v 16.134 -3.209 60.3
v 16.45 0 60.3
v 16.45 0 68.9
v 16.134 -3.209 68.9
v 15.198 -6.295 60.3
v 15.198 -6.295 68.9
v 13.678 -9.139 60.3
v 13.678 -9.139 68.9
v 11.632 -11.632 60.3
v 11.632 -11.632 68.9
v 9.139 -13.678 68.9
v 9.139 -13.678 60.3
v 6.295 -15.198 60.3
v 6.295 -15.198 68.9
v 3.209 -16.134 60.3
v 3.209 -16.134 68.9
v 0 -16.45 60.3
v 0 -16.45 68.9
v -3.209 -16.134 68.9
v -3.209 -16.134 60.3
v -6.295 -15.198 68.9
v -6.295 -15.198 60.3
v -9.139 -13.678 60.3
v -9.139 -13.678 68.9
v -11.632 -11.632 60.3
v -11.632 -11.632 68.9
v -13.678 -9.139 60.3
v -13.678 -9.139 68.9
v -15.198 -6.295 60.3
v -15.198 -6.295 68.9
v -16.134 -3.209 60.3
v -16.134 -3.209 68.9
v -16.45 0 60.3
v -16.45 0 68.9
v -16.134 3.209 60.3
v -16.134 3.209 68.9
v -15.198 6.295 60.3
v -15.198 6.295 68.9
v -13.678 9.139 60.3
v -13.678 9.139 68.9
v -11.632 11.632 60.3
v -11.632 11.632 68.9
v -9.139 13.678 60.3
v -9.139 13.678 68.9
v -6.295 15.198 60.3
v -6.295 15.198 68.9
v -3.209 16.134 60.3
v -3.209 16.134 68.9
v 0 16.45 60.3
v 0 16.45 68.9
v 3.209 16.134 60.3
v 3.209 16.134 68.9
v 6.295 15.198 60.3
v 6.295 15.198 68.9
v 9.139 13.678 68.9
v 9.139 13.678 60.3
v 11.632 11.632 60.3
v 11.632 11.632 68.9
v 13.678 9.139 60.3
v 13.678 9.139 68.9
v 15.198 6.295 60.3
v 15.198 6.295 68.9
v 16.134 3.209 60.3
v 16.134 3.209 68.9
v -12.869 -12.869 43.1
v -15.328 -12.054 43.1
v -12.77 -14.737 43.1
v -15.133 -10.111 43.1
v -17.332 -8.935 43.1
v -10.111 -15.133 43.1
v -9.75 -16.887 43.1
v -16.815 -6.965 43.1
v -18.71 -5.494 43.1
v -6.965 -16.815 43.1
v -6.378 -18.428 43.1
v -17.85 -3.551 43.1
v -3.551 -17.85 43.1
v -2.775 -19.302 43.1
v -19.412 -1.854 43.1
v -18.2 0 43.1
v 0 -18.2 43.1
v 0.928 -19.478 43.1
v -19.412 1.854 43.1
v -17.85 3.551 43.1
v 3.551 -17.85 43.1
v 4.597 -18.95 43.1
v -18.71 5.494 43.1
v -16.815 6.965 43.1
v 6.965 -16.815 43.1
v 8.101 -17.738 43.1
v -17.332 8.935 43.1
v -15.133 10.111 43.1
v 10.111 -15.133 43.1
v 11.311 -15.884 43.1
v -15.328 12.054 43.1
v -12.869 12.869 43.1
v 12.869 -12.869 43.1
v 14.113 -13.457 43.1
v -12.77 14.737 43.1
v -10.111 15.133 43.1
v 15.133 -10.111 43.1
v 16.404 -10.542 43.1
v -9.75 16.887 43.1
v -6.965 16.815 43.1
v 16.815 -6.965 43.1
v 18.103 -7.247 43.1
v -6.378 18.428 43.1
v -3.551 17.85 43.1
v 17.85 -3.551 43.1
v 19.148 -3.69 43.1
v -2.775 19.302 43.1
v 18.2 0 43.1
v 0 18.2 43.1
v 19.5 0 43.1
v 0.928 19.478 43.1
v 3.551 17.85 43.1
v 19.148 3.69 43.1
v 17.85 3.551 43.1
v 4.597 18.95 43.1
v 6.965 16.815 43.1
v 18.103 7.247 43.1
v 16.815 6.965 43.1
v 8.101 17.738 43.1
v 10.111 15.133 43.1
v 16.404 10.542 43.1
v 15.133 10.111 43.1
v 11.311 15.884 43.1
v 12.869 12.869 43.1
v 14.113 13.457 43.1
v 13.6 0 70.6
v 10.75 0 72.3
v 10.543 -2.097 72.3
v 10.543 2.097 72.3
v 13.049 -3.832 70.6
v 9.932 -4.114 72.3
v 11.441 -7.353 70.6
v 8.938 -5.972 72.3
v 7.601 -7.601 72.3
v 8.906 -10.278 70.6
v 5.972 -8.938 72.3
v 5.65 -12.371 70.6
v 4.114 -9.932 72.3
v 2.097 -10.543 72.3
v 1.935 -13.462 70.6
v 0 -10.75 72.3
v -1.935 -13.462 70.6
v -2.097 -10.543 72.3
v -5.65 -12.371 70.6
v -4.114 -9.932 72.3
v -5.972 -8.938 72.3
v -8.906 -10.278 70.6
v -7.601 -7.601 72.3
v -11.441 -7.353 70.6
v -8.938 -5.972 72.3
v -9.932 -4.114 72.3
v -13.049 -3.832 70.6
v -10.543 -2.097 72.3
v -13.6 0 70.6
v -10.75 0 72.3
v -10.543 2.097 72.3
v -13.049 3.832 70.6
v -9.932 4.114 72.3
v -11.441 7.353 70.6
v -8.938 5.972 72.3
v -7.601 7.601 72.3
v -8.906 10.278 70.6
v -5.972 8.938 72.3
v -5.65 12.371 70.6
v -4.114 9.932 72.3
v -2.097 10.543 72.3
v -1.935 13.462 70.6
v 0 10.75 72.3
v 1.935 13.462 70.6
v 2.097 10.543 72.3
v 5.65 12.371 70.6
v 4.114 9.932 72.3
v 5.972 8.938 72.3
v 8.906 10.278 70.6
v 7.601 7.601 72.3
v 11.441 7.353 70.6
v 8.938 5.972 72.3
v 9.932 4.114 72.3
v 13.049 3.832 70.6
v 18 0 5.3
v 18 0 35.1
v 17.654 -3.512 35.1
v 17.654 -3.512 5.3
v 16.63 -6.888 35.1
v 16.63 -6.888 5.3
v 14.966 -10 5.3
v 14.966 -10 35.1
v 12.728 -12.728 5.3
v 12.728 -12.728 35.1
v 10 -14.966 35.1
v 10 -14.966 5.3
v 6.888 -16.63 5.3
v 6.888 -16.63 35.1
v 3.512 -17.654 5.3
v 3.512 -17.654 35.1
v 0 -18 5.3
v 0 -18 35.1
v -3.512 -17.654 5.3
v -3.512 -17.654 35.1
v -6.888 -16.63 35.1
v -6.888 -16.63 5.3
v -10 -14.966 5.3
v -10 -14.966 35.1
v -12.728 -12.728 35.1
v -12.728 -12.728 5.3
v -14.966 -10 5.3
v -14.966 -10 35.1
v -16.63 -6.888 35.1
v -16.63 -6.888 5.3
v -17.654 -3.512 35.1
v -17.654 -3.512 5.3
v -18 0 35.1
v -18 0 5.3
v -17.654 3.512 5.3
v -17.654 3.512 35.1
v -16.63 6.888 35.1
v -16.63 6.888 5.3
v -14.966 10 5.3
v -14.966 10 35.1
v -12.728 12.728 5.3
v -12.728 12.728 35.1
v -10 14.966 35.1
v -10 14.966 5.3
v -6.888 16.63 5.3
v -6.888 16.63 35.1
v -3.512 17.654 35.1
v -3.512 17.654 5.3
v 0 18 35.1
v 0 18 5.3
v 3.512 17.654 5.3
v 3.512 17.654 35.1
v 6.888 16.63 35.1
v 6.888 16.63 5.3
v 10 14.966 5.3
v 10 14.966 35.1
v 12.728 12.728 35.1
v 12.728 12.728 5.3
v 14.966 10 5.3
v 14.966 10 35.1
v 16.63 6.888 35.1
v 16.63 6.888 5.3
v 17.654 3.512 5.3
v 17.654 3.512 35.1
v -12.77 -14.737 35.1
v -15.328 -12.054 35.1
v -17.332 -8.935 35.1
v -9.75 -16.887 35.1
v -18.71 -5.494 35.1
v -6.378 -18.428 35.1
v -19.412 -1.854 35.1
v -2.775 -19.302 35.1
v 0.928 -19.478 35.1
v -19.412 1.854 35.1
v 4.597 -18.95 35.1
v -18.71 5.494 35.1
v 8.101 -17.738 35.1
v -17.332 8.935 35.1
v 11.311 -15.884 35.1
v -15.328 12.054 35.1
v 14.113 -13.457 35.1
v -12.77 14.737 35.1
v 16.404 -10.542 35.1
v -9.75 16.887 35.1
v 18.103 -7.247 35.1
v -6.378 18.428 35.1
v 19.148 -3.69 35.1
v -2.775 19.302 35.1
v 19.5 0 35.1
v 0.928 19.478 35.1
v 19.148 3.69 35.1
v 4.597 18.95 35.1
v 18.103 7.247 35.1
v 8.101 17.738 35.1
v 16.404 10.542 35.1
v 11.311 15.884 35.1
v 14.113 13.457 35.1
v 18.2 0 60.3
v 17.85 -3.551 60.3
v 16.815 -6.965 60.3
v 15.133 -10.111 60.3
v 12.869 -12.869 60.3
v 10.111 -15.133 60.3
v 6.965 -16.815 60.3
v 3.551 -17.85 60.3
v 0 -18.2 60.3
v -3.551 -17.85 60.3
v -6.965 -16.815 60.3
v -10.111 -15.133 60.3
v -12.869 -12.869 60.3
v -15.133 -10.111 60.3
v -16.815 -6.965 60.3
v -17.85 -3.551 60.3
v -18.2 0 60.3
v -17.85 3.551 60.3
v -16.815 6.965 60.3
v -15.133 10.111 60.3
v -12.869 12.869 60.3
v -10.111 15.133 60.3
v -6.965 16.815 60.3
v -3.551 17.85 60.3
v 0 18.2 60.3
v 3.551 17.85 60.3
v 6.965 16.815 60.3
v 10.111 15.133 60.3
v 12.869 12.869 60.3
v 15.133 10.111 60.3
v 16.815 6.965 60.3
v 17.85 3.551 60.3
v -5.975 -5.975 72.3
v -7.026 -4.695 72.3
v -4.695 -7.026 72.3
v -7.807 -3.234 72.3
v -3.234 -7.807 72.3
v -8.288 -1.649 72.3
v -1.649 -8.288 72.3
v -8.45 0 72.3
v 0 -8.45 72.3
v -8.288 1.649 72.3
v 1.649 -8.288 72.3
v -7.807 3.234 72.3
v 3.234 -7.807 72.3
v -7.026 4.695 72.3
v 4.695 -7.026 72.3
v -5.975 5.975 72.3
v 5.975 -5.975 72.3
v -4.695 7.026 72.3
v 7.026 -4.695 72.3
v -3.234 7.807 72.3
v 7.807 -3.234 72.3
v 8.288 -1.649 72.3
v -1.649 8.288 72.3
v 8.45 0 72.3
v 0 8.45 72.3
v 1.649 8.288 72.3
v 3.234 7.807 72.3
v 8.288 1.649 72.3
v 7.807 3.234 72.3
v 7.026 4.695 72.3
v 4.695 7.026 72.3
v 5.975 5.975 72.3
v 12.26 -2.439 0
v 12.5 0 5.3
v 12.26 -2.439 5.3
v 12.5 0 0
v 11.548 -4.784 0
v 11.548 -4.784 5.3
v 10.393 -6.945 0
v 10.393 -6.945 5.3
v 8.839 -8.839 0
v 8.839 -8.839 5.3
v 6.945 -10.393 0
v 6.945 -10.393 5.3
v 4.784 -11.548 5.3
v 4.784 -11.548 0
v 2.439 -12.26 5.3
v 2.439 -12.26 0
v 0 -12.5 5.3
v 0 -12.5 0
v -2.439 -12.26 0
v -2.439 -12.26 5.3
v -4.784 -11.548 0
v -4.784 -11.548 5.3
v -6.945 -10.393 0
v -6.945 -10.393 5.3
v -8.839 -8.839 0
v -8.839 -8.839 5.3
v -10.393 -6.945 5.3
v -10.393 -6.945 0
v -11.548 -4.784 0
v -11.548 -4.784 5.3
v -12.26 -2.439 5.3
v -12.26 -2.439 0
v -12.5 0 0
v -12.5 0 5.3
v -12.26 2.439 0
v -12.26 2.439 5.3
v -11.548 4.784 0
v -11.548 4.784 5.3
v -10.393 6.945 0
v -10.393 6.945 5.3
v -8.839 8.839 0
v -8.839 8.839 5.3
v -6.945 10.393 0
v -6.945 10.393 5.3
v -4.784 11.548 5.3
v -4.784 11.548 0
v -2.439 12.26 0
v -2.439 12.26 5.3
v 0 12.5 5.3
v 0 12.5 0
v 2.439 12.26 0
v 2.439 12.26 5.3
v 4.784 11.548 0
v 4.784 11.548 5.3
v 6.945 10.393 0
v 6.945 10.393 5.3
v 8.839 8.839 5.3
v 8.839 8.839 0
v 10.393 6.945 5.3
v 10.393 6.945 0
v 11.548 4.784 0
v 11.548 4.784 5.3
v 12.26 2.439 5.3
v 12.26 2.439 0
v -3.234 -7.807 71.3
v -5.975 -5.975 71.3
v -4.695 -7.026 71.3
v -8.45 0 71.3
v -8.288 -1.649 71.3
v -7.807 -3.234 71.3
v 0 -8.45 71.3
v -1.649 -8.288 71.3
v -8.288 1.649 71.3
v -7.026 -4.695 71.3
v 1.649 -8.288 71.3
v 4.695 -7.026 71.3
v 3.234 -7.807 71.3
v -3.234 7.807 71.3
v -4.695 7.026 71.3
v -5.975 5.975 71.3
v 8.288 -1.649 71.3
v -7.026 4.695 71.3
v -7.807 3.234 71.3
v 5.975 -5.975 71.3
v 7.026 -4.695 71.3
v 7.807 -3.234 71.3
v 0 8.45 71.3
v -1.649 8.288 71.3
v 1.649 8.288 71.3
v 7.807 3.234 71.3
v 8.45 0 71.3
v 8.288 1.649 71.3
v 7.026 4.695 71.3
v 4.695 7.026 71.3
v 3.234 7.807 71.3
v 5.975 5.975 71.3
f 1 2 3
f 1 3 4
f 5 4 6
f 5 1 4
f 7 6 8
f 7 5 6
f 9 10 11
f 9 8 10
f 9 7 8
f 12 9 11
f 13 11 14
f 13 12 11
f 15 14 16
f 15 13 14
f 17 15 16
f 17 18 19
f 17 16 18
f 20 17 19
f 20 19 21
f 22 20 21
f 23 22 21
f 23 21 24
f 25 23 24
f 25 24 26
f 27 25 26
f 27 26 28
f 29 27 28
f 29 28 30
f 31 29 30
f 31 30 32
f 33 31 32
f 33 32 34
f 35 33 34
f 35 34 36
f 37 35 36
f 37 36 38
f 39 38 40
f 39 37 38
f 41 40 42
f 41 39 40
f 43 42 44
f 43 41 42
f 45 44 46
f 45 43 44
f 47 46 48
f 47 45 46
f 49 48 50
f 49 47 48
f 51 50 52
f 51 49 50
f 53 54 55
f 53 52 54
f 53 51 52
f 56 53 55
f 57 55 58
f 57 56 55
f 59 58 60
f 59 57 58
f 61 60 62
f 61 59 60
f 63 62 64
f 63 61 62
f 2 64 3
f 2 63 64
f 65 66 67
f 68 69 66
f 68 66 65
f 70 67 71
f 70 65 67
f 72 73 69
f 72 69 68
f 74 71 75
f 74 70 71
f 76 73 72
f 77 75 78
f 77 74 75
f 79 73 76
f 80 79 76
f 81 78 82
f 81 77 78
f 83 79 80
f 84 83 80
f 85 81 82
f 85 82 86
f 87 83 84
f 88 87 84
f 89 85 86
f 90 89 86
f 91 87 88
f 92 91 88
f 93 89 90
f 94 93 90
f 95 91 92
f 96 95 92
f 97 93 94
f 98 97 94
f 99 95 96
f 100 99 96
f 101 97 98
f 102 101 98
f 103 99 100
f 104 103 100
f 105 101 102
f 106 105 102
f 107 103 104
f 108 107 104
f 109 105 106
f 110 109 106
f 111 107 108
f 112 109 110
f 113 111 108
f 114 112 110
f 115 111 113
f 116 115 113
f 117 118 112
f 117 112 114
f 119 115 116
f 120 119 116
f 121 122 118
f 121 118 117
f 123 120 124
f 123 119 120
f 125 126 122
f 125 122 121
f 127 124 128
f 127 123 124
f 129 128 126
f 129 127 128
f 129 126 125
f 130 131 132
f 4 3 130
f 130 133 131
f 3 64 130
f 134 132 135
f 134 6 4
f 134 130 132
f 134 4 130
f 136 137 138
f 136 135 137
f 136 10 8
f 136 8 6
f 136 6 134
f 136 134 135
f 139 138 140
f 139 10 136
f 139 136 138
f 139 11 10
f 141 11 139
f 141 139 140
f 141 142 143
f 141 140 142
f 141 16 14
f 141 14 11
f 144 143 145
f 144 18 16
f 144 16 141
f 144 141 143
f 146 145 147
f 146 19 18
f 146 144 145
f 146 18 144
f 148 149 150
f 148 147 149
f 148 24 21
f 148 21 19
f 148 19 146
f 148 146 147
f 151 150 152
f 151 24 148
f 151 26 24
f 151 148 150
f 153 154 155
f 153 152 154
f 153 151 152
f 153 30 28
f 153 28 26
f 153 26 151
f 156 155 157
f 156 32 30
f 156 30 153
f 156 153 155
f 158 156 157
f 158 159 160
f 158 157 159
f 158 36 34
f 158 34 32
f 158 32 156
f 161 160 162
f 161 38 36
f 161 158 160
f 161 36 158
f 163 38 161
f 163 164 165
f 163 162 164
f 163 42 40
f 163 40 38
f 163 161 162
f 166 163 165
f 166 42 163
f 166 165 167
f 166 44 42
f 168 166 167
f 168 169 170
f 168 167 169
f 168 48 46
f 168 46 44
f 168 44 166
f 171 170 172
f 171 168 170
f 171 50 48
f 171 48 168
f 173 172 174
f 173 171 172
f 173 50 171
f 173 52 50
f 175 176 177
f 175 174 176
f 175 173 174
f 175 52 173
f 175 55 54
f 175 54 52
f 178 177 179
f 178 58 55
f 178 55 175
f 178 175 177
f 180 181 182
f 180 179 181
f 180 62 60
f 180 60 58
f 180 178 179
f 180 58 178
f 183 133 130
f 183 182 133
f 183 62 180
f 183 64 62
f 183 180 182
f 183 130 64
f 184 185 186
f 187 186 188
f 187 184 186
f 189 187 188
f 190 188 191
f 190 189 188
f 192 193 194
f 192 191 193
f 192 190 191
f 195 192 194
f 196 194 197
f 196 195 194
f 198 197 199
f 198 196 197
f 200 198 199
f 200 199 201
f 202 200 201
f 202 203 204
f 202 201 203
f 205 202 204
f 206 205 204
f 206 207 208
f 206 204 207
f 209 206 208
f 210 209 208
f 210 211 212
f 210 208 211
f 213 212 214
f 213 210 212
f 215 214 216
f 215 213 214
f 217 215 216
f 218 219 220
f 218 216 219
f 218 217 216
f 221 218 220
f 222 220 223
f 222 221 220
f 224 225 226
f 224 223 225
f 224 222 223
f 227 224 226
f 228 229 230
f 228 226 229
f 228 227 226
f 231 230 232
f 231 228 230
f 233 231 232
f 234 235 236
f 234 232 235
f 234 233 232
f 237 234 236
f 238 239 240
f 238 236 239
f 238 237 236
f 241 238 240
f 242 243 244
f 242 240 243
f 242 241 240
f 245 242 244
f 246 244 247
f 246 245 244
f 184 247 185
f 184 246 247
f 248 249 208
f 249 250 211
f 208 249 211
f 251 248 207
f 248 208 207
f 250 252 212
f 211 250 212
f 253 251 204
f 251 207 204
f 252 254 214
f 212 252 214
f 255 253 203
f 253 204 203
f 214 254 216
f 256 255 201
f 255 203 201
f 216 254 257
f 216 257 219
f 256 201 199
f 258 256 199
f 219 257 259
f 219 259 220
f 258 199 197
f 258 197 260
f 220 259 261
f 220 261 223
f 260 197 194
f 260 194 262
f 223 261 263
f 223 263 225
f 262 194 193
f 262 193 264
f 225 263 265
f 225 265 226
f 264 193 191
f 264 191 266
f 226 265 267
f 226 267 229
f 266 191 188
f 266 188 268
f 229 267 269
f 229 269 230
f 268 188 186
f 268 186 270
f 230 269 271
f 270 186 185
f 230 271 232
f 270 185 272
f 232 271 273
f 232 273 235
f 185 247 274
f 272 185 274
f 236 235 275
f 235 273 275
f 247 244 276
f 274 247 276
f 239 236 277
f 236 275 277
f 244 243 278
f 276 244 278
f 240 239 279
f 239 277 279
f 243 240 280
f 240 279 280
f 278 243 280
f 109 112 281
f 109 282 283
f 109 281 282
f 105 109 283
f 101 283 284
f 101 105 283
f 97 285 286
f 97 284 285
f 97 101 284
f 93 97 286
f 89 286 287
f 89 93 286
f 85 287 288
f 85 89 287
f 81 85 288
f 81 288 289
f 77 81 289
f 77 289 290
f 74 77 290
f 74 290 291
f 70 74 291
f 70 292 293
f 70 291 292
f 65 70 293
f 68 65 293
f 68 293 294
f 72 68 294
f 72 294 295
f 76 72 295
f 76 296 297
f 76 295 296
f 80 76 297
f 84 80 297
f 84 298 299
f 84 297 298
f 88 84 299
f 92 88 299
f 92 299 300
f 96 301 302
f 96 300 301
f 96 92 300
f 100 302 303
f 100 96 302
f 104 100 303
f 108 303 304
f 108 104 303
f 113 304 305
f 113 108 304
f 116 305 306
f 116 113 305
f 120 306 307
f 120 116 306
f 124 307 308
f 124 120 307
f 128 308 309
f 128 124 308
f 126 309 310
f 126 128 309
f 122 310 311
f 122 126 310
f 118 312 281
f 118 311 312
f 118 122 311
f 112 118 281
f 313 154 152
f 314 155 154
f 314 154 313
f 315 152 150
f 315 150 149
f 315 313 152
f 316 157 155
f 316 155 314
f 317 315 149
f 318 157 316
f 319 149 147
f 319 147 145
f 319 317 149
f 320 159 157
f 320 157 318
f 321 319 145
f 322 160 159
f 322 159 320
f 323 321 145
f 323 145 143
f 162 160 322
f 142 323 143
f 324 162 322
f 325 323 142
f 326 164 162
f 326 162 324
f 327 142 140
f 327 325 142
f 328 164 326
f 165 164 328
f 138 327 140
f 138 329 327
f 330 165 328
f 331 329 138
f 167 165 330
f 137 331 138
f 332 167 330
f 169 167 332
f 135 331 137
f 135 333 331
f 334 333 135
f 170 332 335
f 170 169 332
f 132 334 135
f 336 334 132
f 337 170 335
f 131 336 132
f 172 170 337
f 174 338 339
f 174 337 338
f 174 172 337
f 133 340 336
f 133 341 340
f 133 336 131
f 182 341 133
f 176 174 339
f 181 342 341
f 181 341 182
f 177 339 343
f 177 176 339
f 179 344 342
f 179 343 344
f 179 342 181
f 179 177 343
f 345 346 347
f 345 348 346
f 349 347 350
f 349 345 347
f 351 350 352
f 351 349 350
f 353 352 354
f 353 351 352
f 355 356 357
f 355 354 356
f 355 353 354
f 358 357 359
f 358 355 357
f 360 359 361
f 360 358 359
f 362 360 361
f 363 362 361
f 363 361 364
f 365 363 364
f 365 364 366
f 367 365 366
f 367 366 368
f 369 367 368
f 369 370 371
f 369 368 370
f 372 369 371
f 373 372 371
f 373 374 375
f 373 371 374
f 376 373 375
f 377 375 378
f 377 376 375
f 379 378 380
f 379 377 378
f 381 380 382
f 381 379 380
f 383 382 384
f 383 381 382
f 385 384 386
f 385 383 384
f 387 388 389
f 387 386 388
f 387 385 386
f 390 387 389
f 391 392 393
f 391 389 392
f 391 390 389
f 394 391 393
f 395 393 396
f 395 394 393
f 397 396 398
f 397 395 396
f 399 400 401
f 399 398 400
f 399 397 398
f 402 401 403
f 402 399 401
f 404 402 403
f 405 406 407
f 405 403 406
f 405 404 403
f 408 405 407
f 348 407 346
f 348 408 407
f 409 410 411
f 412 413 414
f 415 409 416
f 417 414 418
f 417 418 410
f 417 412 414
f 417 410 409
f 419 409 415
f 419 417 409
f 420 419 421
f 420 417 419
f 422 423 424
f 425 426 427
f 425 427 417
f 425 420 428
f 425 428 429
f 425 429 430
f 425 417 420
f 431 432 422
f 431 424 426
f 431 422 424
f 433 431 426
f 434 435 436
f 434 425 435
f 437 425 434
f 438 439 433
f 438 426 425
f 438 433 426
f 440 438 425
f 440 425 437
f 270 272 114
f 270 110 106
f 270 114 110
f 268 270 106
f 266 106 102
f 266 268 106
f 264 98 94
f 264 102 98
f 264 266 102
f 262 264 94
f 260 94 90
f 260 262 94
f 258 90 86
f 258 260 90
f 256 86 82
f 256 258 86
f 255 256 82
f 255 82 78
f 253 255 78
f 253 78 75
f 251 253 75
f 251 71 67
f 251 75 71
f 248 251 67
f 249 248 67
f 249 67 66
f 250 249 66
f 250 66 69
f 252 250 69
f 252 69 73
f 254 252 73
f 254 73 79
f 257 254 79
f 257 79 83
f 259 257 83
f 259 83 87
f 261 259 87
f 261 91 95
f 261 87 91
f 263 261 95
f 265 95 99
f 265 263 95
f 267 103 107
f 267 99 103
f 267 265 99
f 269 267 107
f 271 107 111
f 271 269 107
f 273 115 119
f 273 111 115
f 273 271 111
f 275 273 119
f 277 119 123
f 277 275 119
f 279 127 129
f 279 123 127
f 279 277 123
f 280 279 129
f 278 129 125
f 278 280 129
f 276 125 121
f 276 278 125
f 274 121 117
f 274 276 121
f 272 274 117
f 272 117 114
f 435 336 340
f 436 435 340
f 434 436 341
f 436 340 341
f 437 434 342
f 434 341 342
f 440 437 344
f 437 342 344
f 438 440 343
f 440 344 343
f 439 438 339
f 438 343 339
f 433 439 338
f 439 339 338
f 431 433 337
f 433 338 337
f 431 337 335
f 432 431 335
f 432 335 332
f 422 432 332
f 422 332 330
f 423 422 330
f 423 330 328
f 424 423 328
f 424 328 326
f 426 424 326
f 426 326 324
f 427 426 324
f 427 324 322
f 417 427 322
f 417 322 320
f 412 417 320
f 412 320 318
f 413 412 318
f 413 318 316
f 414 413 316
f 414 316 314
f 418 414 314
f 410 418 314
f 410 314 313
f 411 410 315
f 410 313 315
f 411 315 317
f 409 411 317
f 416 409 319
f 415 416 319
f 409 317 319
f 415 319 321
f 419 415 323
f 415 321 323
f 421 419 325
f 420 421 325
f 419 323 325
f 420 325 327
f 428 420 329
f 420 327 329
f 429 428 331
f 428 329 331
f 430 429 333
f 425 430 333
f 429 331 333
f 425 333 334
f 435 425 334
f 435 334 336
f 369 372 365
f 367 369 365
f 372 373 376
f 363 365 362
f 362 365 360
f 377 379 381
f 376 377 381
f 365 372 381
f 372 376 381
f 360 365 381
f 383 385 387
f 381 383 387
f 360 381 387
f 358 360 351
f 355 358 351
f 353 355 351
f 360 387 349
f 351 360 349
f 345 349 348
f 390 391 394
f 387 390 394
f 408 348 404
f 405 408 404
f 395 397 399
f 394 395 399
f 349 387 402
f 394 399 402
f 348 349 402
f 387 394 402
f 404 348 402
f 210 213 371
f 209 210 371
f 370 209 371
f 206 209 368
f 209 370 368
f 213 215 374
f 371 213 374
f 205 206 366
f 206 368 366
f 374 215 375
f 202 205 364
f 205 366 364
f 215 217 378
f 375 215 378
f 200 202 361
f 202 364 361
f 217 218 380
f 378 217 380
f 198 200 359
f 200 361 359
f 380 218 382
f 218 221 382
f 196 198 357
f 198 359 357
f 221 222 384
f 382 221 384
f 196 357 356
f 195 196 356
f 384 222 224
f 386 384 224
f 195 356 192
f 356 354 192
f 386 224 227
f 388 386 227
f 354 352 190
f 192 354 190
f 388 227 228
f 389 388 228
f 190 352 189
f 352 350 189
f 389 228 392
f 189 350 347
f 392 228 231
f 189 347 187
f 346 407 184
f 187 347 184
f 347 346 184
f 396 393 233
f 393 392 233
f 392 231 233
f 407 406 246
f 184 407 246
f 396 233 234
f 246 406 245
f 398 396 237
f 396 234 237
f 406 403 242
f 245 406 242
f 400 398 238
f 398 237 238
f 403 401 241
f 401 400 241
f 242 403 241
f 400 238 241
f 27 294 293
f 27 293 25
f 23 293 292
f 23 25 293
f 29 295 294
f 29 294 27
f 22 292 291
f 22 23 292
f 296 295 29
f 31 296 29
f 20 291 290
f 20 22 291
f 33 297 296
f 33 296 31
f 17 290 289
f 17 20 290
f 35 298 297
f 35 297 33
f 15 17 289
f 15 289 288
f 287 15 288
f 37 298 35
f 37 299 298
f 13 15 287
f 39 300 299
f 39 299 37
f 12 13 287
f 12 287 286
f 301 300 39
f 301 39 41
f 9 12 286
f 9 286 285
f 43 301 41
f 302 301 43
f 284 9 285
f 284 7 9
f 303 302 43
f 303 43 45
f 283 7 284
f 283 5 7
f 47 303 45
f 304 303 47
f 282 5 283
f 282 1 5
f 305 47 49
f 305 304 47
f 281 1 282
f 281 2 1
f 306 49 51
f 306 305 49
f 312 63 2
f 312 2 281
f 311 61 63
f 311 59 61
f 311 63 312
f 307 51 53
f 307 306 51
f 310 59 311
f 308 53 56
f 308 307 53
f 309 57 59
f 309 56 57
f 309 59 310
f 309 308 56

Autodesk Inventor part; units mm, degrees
ref_plane "YZ Plane" through (0, 0, 0) normal (1, 0, 0) x (0, 1, 0)
ref_plane "XZ Plane" through (0, 0, 0) normal (0, 1, 0) x (-1, 0, 0)
sketch "Sketch1" plane through (0, 0, 0) normal (0, 0, 1) x (1, 0, 0)
  circle A0 centre (0, 0) radius 12.5
  dimension "d0" = 25
extrude "Extrusion1" add sketch "Sketch1" along normal blind 5.3
sketch "Sketch2" plane through (0, 0, 5.3) normal (0, 0, 1) x (1, 0, 0)
  circle A0 centre (0, 0) radius 18
  dimension "d3" = 36
extrude "Extrusion2" add sketch "Sketch2" along normal blind 29.8
sketch "Sketch3" plane through (0, 0, 35.1) normal (0, 0, 1) x (1, 0, 0)
  circle A0 centre (0, 0) radius 19.5
  dimension "d6" = 39
extrude "Extrusion3" add sketch "Sketch3" along normal blind 8
sketch "Sketch4" plane through (0, 0, 43.1) normal (0, 0, 1) x (1, 0, 0)
  circle A0 centre (0, 0) radius 18.2
  dimension "d9" = 36.4
extrude "Extrusion4" add sketch "Sketch4" along normal blind 17.2
sketch "Sketch5" plane through (0, 0, 60.3) normal (0, 0, 1) x (1, 0, 0)
  circle A0 centre (0, 0) radius 16.45
  dimension "d12" = 32.9
extrude "Extrusion5" add sketch "Sketch5" along normal blind 1.8
sketch "Sketch6" plane through (0, 0, 62.1) normal (0, 0, 1) x (1, 0, 0)
  circle A0 centre (0, 0) radius 16.45
  dimension "d15" = 32.9
extrude "Extrusion6" add sketch "Sketch6" along normal blind 6.8
sketch "Sketch7" plane through (0, 0, 68.9) normal (0, 0, 1) x (1, 0, 0)
  circle A0 centre (0, 0) radius 16.45
  dimension "d18" = 32.9
ref_plane "Work Plane1" through (0, 0, 72.3) normal (0, 0, 1) x (1, 0, 0)
sketch "Sketch8" plane through (0, 0, 72.3) normal (0, 0, 1) x (1, 0, 0)
  circle A0 centre (0, 0) radius 10.75
  dimension "d20" = 21.5
loft "Loft1" add profiles "Sketch8" section 1 edges at (-16.45, 0, 68.9)
sketch "Sketch9" plane through (0, 0, 72.3) normal (0, 0, 1) x (1, 0, 0)
  circle A0 centre (0, 0) radius 8.45
  dimension "d25" = 16.9
extrude "Extrusion7" cut sketch "Sketch9" against normal blind 1
properties part number "olympusXLSLPLN25XGMP_vFIN"
